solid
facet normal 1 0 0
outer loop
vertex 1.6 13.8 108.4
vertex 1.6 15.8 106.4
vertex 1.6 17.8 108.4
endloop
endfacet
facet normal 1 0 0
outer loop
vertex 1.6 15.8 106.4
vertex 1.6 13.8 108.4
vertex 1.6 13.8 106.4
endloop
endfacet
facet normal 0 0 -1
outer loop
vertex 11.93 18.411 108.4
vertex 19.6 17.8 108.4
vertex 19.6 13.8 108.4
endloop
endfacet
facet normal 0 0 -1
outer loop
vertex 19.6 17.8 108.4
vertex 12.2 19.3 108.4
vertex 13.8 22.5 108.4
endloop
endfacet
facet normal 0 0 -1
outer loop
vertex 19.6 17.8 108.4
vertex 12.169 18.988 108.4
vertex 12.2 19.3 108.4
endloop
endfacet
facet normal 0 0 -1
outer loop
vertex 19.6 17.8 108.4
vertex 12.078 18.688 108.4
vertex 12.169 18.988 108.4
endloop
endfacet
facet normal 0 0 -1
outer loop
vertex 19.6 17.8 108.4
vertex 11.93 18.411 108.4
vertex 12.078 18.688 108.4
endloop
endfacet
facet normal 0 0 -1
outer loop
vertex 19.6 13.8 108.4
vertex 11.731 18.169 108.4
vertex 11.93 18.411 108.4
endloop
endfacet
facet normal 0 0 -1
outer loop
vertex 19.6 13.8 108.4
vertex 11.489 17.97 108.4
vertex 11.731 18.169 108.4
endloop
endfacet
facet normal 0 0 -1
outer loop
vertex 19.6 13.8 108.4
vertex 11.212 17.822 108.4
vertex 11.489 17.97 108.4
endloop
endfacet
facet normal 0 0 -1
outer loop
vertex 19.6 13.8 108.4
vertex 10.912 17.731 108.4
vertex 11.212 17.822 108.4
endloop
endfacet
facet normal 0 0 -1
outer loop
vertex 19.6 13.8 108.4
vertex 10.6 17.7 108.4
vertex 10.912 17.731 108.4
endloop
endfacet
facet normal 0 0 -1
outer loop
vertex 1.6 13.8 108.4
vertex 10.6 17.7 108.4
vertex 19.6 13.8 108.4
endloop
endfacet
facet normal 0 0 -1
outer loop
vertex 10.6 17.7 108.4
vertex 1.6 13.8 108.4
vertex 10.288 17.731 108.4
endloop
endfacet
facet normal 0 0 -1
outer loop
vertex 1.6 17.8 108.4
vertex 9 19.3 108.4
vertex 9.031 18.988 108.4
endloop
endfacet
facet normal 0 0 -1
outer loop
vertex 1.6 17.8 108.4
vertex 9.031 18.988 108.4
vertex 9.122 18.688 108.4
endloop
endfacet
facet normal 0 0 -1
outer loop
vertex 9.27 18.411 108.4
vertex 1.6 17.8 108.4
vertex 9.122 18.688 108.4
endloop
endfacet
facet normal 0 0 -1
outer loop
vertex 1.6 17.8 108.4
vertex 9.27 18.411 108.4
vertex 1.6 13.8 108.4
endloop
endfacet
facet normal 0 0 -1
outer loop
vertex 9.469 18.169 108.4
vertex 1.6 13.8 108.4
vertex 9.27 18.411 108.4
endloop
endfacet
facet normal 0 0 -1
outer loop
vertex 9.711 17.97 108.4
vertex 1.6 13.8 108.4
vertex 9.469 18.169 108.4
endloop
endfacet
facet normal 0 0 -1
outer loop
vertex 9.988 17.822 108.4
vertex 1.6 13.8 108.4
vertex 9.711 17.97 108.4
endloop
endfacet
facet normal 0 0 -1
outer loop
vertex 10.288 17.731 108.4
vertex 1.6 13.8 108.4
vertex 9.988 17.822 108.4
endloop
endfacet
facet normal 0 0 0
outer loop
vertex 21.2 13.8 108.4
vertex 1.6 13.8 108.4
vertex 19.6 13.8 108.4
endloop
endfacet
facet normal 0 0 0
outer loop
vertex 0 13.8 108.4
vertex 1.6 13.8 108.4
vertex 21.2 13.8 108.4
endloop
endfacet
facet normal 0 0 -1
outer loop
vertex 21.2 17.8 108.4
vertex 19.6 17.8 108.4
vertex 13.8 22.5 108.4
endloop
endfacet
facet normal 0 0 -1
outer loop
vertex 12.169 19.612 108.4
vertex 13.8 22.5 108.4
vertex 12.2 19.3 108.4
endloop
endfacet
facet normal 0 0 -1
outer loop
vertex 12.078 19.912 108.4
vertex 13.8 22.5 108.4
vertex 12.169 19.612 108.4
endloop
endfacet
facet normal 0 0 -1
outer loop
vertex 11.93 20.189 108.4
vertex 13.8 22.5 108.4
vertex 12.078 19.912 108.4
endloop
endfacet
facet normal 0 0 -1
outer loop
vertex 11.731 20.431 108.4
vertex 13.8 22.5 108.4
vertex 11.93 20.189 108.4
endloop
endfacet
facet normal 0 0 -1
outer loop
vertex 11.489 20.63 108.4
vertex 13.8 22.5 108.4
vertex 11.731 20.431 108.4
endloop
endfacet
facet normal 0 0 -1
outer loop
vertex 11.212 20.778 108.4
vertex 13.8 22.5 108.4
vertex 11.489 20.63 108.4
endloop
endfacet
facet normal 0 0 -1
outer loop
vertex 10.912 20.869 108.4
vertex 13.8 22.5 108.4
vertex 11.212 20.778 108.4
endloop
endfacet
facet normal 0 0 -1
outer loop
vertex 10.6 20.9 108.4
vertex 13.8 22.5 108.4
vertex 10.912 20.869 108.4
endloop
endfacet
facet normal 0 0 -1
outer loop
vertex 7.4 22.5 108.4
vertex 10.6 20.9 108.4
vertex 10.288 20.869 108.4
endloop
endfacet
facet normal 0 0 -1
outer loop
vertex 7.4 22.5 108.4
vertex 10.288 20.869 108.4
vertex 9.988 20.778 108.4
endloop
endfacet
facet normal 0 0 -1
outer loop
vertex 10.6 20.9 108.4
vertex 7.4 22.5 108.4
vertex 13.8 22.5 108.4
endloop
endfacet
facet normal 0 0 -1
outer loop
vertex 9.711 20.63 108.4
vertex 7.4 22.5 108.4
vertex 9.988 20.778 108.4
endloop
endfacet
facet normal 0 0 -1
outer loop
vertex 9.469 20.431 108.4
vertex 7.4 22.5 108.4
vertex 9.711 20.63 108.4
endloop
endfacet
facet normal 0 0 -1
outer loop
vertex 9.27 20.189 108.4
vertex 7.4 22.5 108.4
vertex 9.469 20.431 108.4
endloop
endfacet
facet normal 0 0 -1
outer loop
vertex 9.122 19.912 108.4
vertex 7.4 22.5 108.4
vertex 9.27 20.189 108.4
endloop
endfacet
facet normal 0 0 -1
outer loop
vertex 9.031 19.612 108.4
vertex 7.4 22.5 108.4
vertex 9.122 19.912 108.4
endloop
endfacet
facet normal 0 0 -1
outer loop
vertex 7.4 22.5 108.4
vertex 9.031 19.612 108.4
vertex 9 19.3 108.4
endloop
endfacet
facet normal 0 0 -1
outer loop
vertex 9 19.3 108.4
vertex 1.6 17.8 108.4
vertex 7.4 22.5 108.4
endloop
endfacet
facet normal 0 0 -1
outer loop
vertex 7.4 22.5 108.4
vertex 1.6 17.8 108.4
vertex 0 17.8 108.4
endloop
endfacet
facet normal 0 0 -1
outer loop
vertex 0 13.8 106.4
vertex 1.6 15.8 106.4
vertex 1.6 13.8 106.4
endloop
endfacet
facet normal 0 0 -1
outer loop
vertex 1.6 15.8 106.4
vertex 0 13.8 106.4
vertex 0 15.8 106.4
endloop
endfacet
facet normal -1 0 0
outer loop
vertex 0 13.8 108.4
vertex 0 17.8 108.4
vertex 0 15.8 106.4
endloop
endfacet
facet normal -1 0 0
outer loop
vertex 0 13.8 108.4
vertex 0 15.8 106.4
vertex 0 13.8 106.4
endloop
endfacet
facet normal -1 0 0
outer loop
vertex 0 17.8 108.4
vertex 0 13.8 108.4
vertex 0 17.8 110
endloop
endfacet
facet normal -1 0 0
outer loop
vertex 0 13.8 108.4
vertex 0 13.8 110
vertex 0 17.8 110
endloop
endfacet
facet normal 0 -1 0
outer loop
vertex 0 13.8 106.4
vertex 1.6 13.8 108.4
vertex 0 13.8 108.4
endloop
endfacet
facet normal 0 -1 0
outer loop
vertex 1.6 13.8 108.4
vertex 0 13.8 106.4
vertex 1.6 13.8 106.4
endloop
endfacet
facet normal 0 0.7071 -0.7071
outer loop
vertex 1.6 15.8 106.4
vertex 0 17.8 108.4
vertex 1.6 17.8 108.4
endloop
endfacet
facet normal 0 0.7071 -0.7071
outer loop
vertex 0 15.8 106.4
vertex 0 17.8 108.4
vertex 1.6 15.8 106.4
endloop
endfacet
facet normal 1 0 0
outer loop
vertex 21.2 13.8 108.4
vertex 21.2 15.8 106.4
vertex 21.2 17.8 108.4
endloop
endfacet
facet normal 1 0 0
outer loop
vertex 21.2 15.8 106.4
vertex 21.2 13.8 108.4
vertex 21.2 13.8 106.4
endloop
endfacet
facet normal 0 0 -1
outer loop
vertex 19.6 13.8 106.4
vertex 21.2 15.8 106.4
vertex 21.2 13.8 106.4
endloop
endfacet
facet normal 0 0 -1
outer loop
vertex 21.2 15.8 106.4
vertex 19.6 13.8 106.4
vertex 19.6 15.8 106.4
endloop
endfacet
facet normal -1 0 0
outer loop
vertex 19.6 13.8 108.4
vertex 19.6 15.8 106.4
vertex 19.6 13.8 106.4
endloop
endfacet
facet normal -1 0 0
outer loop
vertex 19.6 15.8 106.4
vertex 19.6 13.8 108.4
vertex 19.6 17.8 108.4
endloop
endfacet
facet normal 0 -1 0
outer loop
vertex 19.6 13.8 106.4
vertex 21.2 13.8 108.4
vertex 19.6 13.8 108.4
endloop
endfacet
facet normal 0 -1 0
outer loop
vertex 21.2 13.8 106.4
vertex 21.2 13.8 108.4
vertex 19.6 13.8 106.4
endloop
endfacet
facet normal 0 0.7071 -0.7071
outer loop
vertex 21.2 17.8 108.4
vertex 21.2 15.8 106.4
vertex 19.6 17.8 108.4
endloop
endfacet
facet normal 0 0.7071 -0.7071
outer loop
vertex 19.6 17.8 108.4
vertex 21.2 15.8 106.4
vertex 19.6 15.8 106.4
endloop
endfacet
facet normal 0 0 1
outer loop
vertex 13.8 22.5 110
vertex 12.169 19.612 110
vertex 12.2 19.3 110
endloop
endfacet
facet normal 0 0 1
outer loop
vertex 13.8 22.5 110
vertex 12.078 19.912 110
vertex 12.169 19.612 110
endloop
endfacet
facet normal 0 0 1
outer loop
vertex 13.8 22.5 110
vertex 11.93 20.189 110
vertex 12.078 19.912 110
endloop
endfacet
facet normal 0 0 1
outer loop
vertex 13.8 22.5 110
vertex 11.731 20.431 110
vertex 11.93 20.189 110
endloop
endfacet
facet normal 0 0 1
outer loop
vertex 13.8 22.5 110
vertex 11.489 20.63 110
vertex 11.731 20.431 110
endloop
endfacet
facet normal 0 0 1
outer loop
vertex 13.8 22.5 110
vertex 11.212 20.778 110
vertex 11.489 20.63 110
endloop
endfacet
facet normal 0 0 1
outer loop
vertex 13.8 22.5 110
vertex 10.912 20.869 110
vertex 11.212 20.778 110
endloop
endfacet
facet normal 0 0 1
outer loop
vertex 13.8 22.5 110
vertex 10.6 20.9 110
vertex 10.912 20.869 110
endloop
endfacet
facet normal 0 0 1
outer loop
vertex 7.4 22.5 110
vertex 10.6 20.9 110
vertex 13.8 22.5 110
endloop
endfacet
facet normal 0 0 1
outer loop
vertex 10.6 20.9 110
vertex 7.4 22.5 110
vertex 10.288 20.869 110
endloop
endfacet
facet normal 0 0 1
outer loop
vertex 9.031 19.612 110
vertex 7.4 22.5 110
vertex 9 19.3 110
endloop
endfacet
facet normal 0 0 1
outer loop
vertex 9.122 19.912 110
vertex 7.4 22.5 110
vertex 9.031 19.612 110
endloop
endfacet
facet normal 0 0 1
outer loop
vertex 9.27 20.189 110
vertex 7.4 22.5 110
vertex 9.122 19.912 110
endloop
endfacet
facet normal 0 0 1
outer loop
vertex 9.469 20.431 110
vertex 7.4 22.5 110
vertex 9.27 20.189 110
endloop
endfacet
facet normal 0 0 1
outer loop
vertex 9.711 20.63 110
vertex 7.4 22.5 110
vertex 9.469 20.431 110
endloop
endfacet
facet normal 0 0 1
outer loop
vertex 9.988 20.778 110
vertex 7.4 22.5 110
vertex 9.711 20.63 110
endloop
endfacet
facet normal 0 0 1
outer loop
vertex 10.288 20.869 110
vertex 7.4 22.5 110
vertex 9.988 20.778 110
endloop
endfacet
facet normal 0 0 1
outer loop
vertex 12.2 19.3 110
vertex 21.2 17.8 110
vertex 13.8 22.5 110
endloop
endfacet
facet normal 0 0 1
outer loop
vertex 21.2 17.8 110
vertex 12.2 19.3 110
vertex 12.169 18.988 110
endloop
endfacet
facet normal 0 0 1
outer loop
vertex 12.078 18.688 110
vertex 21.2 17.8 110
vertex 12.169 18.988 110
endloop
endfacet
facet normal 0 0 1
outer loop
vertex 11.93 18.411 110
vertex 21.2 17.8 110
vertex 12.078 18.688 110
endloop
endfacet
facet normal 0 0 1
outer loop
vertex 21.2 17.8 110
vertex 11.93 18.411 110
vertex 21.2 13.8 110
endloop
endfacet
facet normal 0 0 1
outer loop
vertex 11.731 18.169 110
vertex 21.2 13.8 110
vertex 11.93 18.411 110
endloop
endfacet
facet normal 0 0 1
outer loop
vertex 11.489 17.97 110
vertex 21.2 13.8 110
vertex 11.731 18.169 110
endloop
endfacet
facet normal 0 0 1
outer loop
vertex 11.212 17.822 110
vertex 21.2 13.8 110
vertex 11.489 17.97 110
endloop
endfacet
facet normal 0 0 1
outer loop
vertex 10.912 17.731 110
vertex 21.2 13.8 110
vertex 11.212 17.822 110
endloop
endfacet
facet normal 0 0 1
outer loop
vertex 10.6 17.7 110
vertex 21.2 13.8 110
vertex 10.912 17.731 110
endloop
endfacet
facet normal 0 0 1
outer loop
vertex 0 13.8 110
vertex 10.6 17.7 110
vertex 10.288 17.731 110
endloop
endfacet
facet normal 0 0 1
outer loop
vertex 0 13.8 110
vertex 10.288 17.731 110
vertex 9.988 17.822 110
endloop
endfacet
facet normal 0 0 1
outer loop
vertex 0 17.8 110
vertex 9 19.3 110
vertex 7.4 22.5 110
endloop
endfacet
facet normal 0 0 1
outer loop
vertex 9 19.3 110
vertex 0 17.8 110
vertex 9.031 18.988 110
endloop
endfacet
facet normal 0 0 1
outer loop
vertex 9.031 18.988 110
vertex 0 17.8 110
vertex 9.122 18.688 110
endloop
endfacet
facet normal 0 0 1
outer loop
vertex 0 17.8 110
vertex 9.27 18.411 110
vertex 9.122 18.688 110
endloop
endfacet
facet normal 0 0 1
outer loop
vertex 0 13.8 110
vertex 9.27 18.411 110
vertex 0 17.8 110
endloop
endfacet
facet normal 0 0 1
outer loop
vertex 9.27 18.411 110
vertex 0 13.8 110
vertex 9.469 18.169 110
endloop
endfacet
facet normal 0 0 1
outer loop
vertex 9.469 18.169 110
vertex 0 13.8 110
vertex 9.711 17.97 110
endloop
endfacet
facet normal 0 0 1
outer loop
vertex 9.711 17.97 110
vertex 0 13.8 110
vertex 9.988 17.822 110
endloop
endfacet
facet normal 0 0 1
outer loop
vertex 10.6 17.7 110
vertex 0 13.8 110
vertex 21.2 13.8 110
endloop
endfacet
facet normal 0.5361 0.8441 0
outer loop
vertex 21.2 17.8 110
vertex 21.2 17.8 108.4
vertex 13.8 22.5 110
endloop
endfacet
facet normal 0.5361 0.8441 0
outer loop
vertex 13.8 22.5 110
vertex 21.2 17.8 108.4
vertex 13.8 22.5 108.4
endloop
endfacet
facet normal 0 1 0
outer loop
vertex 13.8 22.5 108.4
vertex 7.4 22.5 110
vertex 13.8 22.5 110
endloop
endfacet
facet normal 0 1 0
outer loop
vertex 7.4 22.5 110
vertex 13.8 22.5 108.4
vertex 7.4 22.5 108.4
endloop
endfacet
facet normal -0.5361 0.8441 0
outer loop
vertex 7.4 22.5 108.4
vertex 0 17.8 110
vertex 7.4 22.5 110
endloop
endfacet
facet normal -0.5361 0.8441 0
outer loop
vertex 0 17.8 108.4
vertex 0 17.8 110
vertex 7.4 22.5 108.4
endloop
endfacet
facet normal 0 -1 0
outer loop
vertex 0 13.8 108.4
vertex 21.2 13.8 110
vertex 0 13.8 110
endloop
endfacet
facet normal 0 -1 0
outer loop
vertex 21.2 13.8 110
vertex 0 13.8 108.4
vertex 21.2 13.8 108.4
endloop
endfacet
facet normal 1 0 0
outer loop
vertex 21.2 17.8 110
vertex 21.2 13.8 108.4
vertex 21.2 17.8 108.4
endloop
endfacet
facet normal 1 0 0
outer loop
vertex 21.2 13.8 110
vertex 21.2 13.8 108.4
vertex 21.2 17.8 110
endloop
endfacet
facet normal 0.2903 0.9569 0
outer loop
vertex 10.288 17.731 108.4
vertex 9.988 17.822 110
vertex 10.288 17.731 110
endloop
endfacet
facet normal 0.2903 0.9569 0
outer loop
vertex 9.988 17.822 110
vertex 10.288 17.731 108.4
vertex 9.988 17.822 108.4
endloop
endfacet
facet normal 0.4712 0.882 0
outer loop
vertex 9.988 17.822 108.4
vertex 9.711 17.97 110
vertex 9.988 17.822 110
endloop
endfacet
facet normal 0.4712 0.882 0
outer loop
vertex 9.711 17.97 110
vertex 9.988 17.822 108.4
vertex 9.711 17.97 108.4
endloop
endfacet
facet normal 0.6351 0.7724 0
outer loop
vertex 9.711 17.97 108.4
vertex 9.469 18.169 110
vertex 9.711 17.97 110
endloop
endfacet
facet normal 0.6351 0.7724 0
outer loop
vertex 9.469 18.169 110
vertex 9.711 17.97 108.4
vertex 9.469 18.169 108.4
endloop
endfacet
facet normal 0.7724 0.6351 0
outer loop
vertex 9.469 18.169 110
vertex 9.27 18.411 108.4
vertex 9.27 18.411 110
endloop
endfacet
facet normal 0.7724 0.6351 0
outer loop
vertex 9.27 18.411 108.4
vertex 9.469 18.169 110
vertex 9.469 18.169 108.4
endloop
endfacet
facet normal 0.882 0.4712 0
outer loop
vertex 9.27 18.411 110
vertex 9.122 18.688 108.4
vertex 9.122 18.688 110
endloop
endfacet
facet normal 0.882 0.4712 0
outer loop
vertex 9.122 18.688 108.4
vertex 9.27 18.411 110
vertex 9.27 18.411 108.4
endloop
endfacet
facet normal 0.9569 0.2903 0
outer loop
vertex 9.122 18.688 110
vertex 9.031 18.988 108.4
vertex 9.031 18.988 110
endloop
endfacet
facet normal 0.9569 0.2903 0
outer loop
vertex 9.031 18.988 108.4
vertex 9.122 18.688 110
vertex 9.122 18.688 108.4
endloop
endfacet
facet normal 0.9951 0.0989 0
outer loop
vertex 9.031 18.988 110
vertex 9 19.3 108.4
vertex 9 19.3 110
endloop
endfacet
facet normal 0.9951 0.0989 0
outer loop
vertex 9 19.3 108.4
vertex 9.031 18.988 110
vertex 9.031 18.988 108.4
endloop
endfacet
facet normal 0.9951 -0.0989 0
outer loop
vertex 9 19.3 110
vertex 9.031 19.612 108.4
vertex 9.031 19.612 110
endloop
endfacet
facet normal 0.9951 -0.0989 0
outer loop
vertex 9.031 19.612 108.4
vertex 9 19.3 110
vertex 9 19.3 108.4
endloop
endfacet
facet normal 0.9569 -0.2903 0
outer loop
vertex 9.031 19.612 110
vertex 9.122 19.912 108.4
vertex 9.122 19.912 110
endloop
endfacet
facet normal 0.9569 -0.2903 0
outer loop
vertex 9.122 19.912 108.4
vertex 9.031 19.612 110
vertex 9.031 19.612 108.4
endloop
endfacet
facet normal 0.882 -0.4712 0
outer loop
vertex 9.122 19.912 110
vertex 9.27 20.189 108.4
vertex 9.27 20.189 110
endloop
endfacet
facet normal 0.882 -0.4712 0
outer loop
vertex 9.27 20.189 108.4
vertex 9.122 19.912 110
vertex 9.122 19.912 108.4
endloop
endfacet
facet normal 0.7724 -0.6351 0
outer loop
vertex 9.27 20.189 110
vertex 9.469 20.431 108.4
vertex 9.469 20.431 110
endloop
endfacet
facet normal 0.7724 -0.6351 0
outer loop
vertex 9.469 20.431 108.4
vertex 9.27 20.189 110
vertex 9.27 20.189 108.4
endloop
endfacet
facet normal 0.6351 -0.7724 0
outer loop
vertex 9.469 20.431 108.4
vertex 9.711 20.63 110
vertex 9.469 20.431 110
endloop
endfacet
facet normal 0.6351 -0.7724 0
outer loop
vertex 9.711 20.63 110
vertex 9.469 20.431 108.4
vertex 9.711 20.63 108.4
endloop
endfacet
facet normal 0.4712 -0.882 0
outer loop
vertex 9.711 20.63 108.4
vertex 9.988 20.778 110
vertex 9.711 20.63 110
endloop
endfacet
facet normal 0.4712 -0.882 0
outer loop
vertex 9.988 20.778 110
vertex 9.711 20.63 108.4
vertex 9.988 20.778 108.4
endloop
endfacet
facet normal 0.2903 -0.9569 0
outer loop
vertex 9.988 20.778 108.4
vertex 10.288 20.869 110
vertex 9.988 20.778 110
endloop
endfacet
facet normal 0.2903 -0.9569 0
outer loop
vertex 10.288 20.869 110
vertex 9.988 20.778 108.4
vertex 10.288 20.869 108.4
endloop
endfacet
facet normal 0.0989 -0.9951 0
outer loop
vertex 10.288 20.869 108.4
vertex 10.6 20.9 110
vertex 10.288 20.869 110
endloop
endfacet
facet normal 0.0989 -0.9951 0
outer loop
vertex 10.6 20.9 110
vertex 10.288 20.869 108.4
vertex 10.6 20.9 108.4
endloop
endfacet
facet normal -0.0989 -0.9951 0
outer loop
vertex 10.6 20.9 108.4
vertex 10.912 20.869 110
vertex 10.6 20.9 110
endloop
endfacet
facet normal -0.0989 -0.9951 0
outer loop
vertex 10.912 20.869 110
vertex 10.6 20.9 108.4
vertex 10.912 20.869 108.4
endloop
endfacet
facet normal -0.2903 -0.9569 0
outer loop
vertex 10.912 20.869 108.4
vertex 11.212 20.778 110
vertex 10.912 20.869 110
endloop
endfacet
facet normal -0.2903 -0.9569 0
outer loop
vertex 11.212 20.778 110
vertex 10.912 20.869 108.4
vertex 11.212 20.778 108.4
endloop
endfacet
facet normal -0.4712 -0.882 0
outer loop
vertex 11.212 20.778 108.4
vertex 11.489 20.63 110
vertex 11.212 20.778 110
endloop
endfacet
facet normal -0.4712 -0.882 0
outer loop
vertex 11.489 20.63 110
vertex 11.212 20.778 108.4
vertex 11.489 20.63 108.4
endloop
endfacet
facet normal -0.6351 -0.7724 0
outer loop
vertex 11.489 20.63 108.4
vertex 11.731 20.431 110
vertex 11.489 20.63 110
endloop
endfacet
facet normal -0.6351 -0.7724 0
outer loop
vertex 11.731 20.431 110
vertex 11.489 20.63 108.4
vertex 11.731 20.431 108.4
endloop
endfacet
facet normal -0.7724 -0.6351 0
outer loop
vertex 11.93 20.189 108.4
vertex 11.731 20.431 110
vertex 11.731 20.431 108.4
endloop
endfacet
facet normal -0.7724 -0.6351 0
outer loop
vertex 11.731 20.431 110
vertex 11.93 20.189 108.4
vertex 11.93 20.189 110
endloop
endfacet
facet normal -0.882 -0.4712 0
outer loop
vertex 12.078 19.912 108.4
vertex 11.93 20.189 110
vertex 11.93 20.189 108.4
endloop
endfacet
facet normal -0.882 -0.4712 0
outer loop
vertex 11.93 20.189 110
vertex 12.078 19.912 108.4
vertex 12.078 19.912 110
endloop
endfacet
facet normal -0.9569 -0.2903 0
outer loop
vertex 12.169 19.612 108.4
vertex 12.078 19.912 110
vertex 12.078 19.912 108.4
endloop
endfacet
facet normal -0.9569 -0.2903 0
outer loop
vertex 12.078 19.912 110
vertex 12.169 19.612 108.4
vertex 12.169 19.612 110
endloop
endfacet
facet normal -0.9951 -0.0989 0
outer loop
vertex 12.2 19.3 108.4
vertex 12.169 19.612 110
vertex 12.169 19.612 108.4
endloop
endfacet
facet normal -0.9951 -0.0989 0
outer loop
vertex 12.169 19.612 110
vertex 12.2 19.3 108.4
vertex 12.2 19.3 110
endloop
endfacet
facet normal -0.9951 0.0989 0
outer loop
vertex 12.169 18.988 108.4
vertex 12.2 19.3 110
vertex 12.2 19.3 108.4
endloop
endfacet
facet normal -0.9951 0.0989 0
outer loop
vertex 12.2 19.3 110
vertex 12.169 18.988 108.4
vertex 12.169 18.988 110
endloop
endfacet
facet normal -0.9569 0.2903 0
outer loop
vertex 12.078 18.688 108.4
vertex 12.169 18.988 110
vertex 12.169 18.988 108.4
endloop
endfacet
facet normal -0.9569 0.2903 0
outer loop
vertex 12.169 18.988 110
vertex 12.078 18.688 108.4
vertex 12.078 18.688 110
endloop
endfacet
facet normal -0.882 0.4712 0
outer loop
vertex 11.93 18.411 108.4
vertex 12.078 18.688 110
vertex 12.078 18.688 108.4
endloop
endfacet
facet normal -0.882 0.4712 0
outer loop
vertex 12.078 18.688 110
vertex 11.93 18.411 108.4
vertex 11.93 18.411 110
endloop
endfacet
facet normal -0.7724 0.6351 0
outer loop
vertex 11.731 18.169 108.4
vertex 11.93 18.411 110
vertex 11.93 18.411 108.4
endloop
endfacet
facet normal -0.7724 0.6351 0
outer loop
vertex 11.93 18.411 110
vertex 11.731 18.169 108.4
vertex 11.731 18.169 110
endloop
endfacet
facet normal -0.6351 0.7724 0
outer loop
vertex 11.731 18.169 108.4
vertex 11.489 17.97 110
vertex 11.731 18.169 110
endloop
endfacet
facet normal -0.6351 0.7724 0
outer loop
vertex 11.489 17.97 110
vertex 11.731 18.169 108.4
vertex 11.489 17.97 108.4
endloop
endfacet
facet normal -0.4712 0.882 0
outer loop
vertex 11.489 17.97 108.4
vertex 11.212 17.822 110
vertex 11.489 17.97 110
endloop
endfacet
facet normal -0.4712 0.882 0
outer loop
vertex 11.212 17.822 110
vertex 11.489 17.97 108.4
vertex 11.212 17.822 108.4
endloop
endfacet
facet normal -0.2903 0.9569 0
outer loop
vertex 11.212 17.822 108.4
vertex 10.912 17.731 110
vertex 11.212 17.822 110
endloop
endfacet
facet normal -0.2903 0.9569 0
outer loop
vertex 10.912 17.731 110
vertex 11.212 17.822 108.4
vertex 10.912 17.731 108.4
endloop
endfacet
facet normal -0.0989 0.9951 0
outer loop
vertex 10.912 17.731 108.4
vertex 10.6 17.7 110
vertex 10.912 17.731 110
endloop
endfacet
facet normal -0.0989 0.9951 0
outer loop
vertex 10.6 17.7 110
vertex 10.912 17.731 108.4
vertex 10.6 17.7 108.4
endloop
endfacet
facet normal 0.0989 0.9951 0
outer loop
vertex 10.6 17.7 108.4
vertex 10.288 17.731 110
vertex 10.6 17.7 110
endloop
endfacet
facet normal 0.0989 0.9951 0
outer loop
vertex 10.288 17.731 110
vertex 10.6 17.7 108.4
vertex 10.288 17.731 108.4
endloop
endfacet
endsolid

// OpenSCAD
// file: ../lib/shapes.scad
// lib/shapes.scad — geometry helpers shared by every part. `use` it: it defines no variables.
// $fn is dynamically scoped, so round things here take the caller's $fn: set `$fn = fn_round;`
// at the top of a part file (after the include) and pass `$fn = fn_small` on small features.

// 2D rectangle `size` = [w, h] with its four corners cut at 45° by c.
// Corner at the origin unless center=true.
module chamfered_rect(size, c, center=false) {
    translate(center ? [-size.x/2, -size.y/2] : [0, 0])
        polygon([[c, 0], [size.x - c, 0], [size.x, c], [size.x, size.y - c],
                 [size.x - c, size.y], [c, size.y], [0, size.y - c], [0, c]]);
}

// 2D rectangle `size` = [w, h] with its four corners rounded by r.
// Corner at the origin unless center=true.
module rounded_rect(size, r, center=false) {
    translate(center ? [0, 0] : [size.x/2, size.y/2])
        offset(r=r) square([size.x - 2*r, size.y - 2*r], center=true);
}

// Box `size` = [x, y, z] with all twelve edges chamfered at 45° by c: the hull of three boxes,
// each shrunk by c along two of its axes, is exactly that.
// Corner at the origin unless center=true.
module chamfered_box(size, c, center=false) {
    translate(center ? -size/2 : [0, 0, 0]) hull() {
        translate([c, c, 0]) cube([size.x - 2*c, size.y - 2*c, size.z]);
        translate([c, 0, c]) cube([size.x - 2*c, size.y, size.z - 2*c]);
        translate([0, c, c]) cube([size.x, size.y - 2*c, size.z - 2*c]);
    }
}

// Hexagonal prism (nut, nut trap): across-flats af, height h along +Z from z=0
// (center=true: centred on z=0). Corners on ±X, flats at y = ±af/2.
module hex(af, h, center=false) {
    cylinder(d=af/cos(30), h=h, center=center, $fn=6);
}

// Torus about Z: centreline radius R, tube radius r, tube centre in the plane z=0.
// The ring takes the caller's $fn; fn_tube (default: the same) sets the tube's.
module torus(R, r, fn_tube) {
    rotate_extrude() translate([R, 0]) circle(r=r, $fn=is_undef(fn_tube) ? $fn : fn_tube);
}

// 2D right triangle: right angle at the origin, leg a along +X, leg b along +Y (b defaults
// to a: a 45° chamfer or gusset). Mirror/rotate it into place, then linear_extrude.
module right_triangle(a, b) {
    polygon([[0, 0], [a, 0], [0, is_undef(b) ? a : b]]);
}

// Section helpers for renders: keep only the part of the children whose coordinate along
// axis ("x" | "y" | "z") is below (keep_below) or above (keep_above) `at`.
// `big` must exceed the model's extent in every direction.
module keep_below(axis, at, big=1000) {
    difference() { children(); translate(_axis_vec(axis)*(at + big)) cube(2*big, center=true); }
}
module keep_above(axis, at, big=1000) {
    difference() { children(); translate(_axis_vec(axis)*(at - big)) cube(2*big, center=true); }
}
function _axis_vec(axis) = axis == "x" ? [1, 0, 0] : axis == "y" ? [0, 1, 0] : [0, 0, 1];
// main file
// parts/screw_holder.scad — bearing plate for the back end of the lead screw [v2 Body008].
//
// A plate `wall` thick standing on the lid plate at the very back, z∈[body_z1 − wall, body_z1]
// (over the inlet plug, glued to the lid): W wide, sh_side_h tall at the sides, straight
// chamfers up to a flat apex at sh_top spanning 2·sh_flat around the rod hole, so exactly one
// wall of material is left above the hole [v2 Sketch020 / Pad013]. Two feet at the sides reach
// sh_foot_len toward the body along the lid's edges and square the plate up [v2 Sketch025 /
// Pad017, 4 long: the cart could not reach the last gate]. The feet's free top corner is
// chamfered 45° [v2 Chamfer006] by sh_foot_chamfer, asserted no larger than the foot.

include <../params.scad>
use <../lib/shapes.scad>
$fn = fn_round;

for_print = false;

z_plate0 = body_z1 - wall;                   // plate front face
z_foot0  = z_plate0 - sh_foot_len;           // feet's free end
foot_c   = sh_foot_chamfer;                  // asserted (in the module) no larger than the foot
eps = 0.01;

function screw_holder_bbox() = [[0, top_y, z_foot0], [W, sh_top, body_z1]];
function screw_holder_size() = screw_holder_bbox()[1] - screw_holder_bbox()[0];

// The asserts live inside the module, not at file top level: `use <screw_holder.scad>` (assembly.scad)
// imports modules, functions and variables but does not execute top-level statements, so a
// file-top assert would be silent in the assembly and only fire on a standalone render.
module screw_holder() {
    assert(foot_c <= min(sh_foot_len, sh_side_h) + num_tol, "screw_holder: foot chamfer larger than the foot");
    // plate with the rod hole
    translate([0, 0, z_plate0]) linear_extrude(wall) difference() {
        polygon([[0, top_y], [0, top_y + sh_side_h], [W/2 - sh_flat, sh_top],
                 [W/2 + sh_flat, sh_top], [W, top_y + sh_side_h], [W, top_y]]);
        translate([W/2, screw_y]) circle(d=screw_hole_d, $fn=fn_small);
    }
    // feet, chamfered on the corner away from the plate and the lid
    for (x0 = [0, W - wall]) translate([x0, 0, 0]) difference() {
        translate([0, top_y, z_foot0]) cube([wall, sh_side_h, sh_foot_len]);
        // rotate([90,0,90]) maps the 2D (u, v) plane to world (y, z), extruding along +X
        translate([-eps, 0, 0]) rotate([90, 0, 90]) linear_extrude(wall + 2*eps)
            translate([top_y + sh_side_h, z_foot0]) mirror([1, 0]) right_triangle(foot_c);
    }
}

// Plate back face on the bed (turned over), feet pointing up; their chamfer becomes a 45° roof.
module screw_holder_print() { translate([W, 0, body_z1]) rotate([0, 180, 0]) screw_holder(); }

if (is_undef(ASSEMBLY)) { if (for_print) screw_holder_print(); else screw_holder(); }
